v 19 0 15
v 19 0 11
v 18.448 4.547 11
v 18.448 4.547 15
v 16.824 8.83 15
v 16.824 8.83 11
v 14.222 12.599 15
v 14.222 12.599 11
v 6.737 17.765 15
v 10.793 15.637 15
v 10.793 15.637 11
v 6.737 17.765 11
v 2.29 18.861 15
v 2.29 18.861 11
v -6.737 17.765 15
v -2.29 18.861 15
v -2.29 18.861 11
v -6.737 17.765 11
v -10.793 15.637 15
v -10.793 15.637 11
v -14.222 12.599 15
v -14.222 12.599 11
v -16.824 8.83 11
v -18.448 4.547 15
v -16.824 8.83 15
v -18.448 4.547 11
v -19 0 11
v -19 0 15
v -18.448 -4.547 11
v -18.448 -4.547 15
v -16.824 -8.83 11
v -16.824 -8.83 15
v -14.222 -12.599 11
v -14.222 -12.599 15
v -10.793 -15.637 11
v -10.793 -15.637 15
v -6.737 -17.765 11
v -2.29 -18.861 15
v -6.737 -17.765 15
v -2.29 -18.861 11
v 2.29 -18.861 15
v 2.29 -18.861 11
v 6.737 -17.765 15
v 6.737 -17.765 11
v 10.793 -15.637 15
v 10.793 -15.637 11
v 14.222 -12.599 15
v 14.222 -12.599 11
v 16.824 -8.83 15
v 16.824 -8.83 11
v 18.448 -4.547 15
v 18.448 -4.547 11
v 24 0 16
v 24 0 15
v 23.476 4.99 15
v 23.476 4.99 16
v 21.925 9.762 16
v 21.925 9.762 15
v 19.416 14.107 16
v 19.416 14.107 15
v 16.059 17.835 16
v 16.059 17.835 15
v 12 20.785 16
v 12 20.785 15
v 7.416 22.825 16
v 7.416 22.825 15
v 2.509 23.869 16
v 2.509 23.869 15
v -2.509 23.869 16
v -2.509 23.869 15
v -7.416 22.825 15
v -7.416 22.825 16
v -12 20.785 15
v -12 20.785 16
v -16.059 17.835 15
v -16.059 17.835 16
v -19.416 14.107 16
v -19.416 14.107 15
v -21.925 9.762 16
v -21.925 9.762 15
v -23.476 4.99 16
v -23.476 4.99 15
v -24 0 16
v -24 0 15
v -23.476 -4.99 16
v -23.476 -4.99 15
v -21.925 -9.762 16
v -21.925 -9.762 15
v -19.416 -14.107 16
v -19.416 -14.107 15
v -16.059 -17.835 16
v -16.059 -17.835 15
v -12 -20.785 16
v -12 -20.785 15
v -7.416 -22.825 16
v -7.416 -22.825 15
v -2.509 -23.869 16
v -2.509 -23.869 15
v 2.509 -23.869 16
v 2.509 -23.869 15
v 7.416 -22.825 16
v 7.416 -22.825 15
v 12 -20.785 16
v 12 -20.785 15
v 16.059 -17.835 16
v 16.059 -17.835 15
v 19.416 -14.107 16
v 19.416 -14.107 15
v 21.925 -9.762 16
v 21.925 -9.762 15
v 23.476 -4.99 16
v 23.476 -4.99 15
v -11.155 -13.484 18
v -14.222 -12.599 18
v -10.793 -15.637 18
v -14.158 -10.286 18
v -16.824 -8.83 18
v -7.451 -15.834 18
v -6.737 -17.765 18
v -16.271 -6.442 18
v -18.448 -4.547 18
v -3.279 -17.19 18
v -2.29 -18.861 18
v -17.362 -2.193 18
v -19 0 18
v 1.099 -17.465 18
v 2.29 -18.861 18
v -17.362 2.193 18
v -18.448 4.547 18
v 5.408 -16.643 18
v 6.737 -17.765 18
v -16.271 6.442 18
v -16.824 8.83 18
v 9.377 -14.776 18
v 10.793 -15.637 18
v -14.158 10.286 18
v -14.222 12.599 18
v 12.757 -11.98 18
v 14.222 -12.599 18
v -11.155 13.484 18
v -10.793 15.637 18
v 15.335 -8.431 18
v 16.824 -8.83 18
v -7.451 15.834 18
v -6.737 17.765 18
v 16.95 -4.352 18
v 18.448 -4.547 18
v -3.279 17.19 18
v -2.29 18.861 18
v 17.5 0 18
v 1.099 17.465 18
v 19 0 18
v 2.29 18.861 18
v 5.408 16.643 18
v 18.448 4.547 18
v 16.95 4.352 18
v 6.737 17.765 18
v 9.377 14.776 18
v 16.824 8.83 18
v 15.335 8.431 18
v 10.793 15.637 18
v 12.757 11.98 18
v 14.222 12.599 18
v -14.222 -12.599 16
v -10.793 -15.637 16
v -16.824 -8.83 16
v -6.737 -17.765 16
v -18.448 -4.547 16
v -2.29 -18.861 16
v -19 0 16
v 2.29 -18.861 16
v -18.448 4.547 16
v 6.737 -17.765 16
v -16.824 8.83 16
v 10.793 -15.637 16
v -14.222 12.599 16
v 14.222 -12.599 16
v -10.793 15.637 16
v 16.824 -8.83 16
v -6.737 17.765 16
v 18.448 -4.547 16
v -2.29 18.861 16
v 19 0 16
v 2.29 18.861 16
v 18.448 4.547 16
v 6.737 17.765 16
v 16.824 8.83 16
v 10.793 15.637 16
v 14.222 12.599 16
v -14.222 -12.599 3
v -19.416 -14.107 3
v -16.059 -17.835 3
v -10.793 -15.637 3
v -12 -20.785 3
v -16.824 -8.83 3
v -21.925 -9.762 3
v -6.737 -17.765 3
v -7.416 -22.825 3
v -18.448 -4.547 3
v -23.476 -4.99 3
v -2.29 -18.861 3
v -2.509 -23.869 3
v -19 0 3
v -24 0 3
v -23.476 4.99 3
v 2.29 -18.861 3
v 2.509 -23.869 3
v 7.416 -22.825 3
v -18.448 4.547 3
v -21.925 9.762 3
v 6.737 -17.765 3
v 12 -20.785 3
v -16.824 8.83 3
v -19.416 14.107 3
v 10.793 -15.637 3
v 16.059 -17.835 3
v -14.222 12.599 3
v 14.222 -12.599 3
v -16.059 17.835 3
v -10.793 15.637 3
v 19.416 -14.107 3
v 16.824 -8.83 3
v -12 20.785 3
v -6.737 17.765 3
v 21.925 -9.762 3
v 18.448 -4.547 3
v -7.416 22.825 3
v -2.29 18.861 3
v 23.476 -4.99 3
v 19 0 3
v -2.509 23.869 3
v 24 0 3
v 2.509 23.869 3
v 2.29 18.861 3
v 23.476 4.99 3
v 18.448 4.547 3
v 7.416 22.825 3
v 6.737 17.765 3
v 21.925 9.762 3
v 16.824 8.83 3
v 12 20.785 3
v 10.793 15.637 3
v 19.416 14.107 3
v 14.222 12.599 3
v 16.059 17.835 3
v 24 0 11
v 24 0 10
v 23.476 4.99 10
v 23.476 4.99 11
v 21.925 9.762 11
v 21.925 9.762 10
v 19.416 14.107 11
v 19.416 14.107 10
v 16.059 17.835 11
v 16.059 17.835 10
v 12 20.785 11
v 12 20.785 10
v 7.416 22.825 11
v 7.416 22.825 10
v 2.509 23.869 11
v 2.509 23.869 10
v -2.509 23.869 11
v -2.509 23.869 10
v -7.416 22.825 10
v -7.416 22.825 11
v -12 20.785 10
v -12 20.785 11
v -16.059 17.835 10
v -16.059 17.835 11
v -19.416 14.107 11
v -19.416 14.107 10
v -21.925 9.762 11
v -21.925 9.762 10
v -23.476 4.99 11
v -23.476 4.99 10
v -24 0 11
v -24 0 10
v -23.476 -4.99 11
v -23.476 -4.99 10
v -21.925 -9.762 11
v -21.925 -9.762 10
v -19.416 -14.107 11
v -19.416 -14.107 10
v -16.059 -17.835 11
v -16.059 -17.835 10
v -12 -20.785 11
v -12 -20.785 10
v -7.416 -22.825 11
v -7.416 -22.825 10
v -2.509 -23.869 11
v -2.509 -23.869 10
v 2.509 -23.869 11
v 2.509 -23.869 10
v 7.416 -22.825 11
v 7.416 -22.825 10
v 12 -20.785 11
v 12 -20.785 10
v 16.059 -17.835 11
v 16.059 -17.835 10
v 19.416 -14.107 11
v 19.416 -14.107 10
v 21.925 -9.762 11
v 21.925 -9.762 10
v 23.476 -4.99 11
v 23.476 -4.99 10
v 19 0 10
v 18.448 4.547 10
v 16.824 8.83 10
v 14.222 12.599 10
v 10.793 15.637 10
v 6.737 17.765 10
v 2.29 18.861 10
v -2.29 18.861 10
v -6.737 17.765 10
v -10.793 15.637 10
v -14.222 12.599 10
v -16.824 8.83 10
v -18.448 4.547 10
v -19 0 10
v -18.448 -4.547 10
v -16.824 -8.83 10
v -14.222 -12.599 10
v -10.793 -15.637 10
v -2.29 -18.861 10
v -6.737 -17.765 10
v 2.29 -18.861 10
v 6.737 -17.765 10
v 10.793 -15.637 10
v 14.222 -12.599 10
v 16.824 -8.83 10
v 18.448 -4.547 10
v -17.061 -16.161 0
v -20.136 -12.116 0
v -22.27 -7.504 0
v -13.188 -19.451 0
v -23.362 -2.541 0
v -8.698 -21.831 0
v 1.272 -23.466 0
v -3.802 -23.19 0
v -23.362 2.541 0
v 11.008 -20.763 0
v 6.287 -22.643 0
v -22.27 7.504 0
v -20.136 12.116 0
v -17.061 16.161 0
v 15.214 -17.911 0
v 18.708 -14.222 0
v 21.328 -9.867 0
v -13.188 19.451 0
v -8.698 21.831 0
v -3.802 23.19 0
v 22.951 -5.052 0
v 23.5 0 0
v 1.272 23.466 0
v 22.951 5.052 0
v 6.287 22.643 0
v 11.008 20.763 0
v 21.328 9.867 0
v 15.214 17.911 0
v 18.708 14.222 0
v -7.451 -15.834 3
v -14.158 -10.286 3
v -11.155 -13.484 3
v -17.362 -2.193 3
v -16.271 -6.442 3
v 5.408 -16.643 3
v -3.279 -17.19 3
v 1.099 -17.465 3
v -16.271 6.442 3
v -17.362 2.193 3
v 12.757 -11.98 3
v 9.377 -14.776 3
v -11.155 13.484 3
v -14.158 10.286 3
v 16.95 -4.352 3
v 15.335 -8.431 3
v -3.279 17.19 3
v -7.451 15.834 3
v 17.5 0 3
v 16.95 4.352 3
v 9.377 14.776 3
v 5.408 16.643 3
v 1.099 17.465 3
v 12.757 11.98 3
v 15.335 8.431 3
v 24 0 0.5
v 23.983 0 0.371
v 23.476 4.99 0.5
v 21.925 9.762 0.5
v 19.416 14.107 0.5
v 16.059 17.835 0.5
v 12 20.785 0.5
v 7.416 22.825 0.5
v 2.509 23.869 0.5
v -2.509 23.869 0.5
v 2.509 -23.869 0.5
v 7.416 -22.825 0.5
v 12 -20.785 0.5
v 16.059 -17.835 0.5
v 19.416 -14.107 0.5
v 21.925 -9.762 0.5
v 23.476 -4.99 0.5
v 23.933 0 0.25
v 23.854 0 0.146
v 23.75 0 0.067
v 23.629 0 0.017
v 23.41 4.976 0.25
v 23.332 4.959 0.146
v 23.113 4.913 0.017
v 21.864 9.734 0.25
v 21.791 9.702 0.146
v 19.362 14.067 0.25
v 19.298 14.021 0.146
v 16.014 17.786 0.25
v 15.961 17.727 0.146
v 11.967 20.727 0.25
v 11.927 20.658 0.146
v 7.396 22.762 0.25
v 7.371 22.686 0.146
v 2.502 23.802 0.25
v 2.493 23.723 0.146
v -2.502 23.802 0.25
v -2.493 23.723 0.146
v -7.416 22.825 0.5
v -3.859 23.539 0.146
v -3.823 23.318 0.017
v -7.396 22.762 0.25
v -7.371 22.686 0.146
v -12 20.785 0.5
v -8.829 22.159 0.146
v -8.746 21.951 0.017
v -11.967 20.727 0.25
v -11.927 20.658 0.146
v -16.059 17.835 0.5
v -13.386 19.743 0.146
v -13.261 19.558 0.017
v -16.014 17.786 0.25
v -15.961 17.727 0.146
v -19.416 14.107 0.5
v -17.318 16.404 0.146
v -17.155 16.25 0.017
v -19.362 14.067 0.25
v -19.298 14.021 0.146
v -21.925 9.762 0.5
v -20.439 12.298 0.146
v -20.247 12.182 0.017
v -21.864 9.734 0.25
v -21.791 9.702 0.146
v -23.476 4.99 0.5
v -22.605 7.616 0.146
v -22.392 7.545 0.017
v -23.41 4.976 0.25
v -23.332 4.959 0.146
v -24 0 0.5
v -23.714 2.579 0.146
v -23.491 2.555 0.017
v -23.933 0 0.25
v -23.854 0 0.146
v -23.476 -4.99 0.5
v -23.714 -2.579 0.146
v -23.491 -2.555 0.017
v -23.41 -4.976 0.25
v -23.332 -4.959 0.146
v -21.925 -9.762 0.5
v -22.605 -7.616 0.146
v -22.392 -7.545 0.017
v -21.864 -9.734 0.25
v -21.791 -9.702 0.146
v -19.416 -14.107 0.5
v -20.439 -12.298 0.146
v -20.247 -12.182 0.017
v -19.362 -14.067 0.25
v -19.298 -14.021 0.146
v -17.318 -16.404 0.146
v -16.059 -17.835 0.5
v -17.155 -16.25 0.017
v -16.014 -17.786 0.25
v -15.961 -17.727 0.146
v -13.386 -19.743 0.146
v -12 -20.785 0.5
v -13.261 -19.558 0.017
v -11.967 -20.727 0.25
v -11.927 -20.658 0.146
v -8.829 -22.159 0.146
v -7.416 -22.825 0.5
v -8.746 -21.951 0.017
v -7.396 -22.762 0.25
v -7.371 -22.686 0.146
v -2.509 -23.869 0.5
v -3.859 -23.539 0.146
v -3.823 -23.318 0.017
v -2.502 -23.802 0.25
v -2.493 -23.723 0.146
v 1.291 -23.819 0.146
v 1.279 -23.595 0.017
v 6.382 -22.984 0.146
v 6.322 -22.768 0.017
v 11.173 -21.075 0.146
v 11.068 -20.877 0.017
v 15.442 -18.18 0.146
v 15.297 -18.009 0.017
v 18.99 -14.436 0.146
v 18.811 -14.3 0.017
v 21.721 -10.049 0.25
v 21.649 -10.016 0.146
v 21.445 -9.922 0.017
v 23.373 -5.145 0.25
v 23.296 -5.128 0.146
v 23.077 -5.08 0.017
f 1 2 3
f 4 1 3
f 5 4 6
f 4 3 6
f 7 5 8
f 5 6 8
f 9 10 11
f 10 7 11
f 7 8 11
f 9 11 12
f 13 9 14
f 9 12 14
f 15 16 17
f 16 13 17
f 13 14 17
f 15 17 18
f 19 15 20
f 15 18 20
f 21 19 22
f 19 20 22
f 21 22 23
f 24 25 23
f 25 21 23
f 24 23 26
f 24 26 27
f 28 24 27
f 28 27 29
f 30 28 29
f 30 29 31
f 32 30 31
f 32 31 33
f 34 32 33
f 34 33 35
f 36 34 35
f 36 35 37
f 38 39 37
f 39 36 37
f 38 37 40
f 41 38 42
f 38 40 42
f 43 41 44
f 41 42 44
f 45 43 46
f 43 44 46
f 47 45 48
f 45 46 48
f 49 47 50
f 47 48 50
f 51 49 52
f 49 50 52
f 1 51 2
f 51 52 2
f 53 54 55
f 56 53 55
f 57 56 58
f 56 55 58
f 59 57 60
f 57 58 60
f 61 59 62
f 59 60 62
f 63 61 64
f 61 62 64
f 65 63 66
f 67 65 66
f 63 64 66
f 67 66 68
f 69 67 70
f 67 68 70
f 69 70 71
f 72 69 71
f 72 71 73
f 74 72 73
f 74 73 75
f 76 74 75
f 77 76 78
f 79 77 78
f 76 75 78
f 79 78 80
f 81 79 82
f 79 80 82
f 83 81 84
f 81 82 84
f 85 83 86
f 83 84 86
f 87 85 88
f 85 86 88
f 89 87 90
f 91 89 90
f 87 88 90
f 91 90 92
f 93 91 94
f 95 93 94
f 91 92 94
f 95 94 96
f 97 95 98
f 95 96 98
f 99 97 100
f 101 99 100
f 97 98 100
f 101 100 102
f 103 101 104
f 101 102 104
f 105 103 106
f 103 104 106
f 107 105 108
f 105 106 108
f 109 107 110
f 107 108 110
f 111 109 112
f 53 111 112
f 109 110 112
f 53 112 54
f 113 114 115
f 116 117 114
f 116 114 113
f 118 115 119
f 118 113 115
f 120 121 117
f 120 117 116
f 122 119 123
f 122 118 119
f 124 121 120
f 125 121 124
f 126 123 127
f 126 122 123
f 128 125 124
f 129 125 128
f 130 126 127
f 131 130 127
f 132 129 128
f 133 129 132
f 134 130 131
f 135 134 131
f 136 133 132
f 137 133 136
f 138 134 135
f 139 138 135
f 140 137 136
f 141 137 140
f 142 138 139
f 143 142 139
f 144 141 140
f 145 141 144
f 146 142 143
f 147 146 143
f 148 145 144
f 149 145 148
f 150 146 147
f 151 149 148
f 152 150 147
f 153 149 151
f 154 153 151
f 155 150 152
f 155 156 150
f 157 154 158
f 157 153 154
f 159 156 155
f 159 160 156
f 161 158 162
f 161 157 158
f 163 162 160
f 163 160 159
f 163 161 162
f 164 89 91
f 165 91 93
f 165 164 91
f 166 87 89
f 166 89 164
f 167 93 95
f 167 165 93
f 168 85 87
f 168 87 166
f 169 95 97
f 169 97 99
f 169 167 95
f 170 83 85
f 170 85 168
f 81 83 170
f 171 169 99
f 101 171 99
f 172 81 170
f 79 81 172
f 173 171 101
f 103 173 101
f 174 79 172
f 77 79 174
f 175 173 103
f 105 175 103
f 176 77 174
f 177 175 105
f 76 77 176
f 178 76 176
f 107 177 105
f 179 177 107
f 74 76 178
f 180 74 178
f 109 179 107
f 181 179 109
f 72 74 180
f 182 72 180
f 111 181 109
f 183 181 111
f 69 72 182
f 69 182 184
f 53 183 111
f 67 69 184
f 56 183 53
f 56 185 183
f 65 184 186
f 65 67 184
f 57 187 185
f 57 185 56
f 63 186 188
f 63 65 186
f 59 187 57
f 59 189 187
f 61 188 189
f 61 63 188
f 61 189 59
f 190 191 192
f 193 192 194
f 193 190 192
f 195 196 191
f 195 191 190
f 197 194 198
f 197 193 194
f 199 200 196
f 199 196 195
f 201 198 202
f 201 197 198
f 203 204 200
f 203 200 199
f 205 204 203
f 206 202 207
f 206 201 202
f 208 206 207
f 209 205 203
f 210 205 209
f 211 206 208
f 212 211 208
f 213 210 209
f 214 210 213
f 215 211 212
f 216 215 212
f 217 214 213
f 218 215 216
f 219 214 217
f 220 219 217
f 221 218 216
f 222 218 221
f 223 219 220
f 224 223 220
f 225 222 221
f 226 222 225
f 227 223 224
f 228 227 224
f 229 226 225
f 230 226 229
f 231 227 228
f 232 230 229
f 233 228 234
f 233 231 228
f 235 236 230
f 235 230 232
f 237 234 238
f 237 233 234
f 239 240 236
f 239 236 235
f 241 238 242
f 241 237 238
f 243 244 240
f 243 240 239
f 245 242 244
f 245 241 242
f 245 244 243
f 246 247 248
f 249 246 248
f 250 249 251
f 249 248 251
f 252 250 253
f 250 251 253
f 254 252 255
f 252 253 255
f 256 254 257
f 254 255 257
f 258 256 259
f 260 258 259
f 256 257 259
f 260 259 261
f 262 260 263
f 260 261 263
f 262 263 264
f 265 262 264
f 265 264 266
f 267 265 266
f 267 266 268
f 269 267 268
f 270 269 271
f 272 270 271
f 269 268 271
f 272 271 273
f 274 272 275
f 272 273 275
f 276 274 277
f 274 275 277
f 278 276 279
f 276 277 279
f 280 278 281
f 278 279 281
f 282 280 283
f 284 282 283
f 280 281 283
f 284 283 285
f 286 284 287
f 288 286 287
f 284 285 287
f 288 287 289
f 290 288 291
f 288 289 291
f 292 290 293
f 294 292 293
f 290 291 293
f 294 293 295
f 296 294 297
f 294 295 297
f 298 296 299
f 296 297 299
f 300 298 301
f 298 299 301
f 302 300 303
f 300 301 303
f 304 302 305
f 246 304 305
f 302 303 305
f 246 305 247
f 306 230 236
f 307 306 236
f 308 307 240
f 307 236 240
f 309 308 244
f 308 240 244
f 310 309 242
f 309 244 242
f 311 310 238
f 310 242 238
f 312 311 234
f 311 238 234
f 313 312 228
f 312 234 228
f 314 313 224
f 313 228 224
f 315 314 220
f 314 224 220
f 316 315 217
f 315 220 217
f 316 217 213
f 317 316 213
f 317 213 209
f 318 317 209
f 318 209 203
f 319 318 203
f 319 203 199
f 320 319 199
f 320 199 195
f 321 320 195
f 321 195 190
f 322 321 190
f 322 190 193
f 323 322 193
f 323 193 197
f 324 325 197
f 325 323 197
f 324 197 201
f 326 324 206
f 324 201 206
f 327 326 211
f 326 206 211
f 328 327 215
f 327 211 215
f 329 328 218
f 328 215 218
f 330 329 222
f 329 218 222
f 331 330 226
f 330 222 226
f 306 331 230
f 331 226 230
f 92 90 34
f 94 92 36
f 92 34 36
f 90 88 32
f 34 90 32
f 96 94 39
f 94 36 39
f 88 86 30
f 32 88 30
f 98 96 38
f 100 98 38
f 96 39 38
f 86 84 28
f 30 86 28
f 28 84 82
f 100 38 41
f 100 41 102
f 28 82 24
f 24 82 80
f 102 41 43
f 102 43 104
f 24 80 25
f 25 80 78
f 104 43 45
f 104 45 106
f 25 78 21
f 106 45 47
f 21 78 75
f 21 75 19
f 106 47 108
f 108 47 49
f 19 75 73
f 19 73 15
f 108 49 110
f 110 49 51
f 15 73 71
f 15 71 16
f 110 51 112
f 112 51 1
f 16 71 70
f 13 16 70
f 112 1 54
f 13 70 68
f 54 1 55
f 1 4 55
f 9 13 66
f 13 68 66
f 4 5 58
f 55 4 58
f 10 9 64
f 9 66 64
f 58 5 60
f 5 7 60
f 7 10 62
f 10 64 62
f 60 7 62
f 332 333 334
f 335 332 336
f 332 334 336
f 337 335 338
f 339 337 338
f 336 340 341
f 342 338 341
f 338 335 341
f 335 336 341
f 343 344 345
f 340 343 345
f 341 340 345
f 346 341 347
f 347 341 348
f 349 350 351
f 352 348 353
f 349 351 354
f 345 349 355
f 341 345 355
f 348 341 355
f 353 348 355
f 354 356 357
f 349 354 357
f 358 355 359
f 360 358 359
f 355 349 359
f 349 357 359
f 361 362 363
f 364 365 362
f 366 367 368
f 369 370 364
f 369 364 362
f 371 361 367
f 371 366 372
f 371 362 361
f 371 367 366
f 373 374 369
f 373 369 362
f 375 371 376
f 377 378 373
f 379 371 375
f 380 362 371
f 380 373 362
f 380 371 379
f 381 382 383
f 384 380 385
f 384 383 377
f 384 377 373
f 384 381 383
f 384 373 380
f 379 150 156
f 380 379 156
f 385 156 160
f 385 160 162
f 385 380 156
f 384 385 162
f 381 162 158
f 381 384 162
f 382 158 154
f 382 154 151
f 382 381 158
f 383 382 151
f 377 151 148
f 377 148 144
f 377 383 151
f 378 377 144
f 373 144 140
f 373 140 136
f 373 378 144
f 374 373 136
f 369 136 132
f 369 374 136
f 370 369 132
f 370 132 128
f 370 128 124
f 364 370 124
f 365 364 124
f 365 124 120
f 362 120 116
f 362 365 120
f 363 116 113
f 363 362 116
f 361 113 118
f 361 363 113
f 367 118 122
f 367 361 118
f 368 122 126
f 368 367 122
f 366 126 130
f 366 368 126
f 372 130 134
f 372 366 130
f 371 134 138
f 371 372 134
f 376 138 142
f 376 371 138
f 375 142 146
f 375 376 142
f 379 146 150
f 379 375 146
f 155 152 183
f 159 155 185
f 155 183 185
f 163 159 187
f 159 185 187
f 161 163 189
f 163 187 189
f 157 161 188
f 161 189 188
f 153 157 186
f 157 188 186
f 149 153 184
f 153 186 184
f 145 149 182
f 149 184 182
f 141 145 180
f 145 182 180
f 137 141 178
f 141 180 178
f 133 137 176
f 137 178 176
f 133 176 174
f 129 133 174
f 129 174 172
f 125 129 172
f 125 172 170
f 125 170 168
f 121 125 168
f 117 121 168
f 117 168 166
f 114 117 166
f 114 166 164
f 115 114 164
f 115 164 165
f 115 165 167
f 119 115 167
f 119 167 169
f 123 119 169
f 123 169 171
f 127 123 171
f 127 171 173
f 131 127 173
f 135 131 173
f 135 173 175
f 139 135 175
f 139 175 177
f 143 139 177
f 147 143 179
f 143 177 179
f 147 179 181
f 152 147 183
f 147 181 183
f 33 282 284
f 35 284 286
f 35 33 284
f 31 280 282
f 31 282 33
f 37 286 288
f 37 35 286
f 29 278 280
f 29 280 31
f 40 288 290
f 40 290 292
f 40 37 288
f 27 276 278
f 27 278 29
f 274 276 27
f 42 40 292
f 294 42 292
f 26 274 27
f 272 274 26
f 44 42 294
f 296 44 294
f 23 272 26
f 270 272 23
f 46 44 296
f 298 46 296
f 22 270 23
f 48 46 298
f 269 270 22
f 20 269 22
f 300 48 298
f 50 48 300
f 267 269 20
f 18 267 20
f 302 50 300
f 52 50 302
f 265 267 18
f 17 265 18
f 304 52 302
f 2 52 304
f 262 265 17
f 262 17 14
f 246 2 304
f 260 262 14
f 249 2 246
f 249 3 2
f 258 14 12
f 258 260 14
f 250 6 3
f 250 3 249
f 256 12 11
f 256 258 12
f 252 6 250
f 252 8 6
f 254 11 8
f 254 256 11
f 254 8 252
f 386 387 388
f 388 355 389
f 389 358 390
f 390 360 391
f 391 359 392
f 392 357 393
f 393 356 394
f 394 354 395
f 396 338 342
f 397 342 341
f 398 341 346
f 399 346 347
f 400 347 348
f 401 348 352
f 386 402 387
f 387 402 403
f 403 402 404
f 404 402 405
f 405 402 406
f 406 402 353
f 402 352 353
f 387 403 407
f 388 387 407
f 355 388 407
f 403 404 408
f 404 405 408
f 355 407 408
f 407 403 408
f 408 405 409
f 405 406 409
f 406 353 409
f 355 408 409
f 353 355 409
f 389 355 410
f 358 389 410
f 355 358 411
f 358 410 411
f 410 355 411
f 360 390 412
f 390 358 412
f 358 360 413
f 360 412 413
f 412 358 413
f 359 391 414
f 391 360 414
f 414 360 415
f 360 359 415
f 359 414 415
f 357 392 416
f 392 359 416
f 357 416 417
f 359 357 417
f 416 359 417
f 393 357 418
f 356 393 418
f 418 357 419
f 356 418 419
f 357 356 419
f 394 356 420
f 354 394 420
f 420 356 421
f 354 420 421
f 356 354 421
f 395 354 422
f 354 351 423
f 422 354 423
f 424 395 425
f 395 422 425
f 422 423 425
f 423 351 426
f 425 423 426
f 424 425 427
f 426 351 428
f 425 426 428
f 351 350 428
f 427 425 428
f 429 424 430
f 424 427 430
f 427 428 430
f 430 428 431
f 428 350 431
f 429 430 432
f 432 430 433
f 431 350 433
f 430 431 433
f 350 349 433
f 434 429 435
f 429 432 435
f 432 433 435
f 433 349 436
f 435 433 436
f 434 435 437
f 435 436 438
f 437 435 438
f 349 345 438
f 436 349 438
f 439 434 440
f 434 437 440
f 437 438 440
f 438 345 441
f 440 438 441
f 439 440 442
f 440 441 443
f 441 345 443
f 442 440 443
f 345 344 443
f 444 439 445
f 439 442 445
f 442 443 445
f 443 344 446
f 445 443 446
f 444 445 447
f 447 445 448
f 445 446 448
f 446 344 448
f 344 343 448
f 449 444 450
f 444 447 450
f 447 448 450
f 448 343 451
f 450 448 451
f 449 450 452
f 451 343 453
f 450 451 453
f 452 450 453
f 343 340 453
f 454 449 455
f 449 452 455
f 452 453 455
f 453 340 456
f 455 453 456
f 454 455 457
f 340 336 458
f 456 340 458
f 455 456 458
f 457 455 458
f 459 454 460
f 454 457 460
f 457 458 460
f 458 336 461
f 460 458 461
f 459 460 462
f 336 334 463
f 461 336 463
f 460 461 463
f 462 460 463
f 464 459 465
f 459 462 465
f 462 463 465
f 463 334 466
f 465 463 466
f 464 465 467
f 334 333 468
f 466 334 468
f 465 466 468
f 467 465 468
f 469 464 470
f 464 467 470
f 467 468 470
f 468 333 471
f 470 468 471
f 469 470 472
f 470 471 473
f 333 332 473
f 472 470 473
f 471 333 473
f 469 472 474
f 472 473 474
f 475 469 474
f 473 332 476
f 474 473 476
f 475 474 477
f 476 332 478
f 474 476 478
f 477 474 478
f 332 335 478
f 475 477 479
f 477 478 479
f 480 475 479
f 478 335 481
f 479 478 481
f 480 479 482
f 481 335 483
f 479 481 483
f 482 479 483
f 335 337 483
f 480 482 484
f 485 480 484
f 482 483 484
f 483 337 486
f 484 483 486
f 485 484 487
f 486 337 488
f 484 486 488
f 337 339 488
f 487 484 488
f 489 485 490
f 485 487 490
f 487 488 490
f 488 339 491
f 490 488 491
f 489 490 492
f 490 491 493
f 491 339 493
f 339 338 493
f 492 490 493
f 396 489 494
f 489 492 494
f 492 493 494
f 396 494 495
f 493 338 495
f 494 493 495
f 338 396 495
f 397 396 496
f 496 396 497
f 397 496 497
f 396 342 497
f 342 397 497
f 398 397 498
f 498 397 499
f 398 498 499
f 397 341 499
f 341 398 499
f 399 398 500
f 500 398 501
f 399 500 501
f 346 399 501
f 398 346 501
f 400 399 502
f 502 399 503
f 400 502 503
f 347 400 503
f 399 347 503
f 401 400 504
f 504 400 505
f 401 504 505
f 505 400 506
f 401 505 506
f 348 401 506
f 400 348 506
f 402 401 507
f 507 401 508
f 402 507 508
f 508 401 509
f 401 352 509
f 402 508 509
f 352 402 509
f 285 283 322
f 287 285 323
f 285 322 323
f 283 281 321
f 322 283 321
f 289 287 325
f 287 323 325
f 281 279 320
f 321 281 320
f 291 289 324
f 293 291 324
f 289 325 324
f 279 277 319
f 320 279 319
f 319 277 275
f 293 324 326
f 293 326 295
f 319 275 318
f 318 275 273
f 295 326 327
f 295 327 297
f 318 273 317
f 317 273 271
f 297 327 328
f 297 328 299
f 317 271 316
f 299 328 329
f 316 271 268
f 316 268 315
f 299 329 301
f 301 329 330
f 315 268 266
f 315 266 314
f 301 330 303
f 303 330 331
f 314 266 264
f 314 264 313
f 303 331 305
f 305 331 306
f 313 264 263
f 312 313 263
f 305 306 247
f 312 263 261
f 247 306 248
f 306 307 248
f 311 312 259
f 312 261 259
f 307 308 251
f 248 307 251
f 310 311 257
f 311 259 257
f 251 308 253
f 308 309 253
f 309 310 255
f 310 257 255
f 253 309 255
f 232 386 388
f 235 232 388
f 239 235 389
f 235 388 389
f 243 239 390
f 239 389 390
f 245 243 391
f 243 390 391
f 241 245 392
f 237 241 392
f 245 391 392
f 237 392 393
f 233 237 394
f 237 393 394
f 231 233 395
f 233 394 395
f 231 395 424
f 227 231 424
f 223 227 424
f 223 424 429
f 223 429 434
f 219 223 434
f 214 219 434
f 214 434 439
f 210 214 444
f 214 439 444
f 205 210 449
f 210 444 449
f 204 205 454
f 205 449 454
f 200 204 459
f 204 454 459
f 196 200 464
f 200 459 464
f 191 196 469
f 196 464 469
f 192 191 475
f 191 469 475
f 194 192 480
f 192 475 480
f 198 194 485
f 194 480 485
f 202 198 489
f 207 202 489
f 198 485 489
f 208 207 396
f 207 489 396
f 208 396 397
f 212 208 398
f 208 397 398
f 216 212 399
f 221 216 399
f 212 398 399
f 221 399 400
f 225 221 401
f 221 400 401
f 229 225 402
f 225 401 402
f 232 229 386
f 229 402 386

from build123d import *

# Parameters (mm, degrees)
SKETCH_R      = 24
PAD_DEPTH     = 3
SKETCH001_R   = 19
SKETCH001_R_2 = 17.5
PAD001_DEPTH  = 15
SKETCH002_R   = 24
SKETCH002_R_2 = 17.5
PAD002_DEPTH  = 1
SKETCH003_R   = 24
SKETCH003_R_2 = 17.5
PAD003_DEPTH  = 1
FILLET_R      = 0.5


with BuildPart() as part:
    # Sketch → Pad (new body)
    with BuildSketch(Plane.XY):
        Circle(SKETCH_R)
    extrude(amount=PAD_DEPTH)

    # Sketch001 (on Face3 of Pad) → Pad001 (join)
    with BuildSketch(Plane.XY.offset(3)):
        Circle(SKETCH001_R)
        Circle(SKETCH001_R_2, mode=Mode.SUBTRACT)
    extrude(amount=PAD001_DEPTH)

    # Sketch002 (on DatumPlane) → Pad002 (join)
    with BuildSketch(Plane.XY.offset(10)):
        Circle(SKETCH002_R)
        Circle(SKETCH002_R_2, mode=Mode.SUBTRACT)
    extrude(amount=PAD002_DEPTH)

    # Sketch003 (on DatumPlane) → Pad003 (join)
    with BuildSketch(Plane.XY.offset(15)):
        Circle(SKETCH003_R)
        Circle(SKETCH003_R_2, mode=Mode.SUBTRACT)
    extrude(amount=PAD003_DEPTH)

    # Fillet
    fillet_edges = [part.edges().sort_by_distance(p)[0] for p in [
        (-24, 0, 0),
    ]]
    fillet(fillet_edges, radius=FILLET_R)


solid = part.part
